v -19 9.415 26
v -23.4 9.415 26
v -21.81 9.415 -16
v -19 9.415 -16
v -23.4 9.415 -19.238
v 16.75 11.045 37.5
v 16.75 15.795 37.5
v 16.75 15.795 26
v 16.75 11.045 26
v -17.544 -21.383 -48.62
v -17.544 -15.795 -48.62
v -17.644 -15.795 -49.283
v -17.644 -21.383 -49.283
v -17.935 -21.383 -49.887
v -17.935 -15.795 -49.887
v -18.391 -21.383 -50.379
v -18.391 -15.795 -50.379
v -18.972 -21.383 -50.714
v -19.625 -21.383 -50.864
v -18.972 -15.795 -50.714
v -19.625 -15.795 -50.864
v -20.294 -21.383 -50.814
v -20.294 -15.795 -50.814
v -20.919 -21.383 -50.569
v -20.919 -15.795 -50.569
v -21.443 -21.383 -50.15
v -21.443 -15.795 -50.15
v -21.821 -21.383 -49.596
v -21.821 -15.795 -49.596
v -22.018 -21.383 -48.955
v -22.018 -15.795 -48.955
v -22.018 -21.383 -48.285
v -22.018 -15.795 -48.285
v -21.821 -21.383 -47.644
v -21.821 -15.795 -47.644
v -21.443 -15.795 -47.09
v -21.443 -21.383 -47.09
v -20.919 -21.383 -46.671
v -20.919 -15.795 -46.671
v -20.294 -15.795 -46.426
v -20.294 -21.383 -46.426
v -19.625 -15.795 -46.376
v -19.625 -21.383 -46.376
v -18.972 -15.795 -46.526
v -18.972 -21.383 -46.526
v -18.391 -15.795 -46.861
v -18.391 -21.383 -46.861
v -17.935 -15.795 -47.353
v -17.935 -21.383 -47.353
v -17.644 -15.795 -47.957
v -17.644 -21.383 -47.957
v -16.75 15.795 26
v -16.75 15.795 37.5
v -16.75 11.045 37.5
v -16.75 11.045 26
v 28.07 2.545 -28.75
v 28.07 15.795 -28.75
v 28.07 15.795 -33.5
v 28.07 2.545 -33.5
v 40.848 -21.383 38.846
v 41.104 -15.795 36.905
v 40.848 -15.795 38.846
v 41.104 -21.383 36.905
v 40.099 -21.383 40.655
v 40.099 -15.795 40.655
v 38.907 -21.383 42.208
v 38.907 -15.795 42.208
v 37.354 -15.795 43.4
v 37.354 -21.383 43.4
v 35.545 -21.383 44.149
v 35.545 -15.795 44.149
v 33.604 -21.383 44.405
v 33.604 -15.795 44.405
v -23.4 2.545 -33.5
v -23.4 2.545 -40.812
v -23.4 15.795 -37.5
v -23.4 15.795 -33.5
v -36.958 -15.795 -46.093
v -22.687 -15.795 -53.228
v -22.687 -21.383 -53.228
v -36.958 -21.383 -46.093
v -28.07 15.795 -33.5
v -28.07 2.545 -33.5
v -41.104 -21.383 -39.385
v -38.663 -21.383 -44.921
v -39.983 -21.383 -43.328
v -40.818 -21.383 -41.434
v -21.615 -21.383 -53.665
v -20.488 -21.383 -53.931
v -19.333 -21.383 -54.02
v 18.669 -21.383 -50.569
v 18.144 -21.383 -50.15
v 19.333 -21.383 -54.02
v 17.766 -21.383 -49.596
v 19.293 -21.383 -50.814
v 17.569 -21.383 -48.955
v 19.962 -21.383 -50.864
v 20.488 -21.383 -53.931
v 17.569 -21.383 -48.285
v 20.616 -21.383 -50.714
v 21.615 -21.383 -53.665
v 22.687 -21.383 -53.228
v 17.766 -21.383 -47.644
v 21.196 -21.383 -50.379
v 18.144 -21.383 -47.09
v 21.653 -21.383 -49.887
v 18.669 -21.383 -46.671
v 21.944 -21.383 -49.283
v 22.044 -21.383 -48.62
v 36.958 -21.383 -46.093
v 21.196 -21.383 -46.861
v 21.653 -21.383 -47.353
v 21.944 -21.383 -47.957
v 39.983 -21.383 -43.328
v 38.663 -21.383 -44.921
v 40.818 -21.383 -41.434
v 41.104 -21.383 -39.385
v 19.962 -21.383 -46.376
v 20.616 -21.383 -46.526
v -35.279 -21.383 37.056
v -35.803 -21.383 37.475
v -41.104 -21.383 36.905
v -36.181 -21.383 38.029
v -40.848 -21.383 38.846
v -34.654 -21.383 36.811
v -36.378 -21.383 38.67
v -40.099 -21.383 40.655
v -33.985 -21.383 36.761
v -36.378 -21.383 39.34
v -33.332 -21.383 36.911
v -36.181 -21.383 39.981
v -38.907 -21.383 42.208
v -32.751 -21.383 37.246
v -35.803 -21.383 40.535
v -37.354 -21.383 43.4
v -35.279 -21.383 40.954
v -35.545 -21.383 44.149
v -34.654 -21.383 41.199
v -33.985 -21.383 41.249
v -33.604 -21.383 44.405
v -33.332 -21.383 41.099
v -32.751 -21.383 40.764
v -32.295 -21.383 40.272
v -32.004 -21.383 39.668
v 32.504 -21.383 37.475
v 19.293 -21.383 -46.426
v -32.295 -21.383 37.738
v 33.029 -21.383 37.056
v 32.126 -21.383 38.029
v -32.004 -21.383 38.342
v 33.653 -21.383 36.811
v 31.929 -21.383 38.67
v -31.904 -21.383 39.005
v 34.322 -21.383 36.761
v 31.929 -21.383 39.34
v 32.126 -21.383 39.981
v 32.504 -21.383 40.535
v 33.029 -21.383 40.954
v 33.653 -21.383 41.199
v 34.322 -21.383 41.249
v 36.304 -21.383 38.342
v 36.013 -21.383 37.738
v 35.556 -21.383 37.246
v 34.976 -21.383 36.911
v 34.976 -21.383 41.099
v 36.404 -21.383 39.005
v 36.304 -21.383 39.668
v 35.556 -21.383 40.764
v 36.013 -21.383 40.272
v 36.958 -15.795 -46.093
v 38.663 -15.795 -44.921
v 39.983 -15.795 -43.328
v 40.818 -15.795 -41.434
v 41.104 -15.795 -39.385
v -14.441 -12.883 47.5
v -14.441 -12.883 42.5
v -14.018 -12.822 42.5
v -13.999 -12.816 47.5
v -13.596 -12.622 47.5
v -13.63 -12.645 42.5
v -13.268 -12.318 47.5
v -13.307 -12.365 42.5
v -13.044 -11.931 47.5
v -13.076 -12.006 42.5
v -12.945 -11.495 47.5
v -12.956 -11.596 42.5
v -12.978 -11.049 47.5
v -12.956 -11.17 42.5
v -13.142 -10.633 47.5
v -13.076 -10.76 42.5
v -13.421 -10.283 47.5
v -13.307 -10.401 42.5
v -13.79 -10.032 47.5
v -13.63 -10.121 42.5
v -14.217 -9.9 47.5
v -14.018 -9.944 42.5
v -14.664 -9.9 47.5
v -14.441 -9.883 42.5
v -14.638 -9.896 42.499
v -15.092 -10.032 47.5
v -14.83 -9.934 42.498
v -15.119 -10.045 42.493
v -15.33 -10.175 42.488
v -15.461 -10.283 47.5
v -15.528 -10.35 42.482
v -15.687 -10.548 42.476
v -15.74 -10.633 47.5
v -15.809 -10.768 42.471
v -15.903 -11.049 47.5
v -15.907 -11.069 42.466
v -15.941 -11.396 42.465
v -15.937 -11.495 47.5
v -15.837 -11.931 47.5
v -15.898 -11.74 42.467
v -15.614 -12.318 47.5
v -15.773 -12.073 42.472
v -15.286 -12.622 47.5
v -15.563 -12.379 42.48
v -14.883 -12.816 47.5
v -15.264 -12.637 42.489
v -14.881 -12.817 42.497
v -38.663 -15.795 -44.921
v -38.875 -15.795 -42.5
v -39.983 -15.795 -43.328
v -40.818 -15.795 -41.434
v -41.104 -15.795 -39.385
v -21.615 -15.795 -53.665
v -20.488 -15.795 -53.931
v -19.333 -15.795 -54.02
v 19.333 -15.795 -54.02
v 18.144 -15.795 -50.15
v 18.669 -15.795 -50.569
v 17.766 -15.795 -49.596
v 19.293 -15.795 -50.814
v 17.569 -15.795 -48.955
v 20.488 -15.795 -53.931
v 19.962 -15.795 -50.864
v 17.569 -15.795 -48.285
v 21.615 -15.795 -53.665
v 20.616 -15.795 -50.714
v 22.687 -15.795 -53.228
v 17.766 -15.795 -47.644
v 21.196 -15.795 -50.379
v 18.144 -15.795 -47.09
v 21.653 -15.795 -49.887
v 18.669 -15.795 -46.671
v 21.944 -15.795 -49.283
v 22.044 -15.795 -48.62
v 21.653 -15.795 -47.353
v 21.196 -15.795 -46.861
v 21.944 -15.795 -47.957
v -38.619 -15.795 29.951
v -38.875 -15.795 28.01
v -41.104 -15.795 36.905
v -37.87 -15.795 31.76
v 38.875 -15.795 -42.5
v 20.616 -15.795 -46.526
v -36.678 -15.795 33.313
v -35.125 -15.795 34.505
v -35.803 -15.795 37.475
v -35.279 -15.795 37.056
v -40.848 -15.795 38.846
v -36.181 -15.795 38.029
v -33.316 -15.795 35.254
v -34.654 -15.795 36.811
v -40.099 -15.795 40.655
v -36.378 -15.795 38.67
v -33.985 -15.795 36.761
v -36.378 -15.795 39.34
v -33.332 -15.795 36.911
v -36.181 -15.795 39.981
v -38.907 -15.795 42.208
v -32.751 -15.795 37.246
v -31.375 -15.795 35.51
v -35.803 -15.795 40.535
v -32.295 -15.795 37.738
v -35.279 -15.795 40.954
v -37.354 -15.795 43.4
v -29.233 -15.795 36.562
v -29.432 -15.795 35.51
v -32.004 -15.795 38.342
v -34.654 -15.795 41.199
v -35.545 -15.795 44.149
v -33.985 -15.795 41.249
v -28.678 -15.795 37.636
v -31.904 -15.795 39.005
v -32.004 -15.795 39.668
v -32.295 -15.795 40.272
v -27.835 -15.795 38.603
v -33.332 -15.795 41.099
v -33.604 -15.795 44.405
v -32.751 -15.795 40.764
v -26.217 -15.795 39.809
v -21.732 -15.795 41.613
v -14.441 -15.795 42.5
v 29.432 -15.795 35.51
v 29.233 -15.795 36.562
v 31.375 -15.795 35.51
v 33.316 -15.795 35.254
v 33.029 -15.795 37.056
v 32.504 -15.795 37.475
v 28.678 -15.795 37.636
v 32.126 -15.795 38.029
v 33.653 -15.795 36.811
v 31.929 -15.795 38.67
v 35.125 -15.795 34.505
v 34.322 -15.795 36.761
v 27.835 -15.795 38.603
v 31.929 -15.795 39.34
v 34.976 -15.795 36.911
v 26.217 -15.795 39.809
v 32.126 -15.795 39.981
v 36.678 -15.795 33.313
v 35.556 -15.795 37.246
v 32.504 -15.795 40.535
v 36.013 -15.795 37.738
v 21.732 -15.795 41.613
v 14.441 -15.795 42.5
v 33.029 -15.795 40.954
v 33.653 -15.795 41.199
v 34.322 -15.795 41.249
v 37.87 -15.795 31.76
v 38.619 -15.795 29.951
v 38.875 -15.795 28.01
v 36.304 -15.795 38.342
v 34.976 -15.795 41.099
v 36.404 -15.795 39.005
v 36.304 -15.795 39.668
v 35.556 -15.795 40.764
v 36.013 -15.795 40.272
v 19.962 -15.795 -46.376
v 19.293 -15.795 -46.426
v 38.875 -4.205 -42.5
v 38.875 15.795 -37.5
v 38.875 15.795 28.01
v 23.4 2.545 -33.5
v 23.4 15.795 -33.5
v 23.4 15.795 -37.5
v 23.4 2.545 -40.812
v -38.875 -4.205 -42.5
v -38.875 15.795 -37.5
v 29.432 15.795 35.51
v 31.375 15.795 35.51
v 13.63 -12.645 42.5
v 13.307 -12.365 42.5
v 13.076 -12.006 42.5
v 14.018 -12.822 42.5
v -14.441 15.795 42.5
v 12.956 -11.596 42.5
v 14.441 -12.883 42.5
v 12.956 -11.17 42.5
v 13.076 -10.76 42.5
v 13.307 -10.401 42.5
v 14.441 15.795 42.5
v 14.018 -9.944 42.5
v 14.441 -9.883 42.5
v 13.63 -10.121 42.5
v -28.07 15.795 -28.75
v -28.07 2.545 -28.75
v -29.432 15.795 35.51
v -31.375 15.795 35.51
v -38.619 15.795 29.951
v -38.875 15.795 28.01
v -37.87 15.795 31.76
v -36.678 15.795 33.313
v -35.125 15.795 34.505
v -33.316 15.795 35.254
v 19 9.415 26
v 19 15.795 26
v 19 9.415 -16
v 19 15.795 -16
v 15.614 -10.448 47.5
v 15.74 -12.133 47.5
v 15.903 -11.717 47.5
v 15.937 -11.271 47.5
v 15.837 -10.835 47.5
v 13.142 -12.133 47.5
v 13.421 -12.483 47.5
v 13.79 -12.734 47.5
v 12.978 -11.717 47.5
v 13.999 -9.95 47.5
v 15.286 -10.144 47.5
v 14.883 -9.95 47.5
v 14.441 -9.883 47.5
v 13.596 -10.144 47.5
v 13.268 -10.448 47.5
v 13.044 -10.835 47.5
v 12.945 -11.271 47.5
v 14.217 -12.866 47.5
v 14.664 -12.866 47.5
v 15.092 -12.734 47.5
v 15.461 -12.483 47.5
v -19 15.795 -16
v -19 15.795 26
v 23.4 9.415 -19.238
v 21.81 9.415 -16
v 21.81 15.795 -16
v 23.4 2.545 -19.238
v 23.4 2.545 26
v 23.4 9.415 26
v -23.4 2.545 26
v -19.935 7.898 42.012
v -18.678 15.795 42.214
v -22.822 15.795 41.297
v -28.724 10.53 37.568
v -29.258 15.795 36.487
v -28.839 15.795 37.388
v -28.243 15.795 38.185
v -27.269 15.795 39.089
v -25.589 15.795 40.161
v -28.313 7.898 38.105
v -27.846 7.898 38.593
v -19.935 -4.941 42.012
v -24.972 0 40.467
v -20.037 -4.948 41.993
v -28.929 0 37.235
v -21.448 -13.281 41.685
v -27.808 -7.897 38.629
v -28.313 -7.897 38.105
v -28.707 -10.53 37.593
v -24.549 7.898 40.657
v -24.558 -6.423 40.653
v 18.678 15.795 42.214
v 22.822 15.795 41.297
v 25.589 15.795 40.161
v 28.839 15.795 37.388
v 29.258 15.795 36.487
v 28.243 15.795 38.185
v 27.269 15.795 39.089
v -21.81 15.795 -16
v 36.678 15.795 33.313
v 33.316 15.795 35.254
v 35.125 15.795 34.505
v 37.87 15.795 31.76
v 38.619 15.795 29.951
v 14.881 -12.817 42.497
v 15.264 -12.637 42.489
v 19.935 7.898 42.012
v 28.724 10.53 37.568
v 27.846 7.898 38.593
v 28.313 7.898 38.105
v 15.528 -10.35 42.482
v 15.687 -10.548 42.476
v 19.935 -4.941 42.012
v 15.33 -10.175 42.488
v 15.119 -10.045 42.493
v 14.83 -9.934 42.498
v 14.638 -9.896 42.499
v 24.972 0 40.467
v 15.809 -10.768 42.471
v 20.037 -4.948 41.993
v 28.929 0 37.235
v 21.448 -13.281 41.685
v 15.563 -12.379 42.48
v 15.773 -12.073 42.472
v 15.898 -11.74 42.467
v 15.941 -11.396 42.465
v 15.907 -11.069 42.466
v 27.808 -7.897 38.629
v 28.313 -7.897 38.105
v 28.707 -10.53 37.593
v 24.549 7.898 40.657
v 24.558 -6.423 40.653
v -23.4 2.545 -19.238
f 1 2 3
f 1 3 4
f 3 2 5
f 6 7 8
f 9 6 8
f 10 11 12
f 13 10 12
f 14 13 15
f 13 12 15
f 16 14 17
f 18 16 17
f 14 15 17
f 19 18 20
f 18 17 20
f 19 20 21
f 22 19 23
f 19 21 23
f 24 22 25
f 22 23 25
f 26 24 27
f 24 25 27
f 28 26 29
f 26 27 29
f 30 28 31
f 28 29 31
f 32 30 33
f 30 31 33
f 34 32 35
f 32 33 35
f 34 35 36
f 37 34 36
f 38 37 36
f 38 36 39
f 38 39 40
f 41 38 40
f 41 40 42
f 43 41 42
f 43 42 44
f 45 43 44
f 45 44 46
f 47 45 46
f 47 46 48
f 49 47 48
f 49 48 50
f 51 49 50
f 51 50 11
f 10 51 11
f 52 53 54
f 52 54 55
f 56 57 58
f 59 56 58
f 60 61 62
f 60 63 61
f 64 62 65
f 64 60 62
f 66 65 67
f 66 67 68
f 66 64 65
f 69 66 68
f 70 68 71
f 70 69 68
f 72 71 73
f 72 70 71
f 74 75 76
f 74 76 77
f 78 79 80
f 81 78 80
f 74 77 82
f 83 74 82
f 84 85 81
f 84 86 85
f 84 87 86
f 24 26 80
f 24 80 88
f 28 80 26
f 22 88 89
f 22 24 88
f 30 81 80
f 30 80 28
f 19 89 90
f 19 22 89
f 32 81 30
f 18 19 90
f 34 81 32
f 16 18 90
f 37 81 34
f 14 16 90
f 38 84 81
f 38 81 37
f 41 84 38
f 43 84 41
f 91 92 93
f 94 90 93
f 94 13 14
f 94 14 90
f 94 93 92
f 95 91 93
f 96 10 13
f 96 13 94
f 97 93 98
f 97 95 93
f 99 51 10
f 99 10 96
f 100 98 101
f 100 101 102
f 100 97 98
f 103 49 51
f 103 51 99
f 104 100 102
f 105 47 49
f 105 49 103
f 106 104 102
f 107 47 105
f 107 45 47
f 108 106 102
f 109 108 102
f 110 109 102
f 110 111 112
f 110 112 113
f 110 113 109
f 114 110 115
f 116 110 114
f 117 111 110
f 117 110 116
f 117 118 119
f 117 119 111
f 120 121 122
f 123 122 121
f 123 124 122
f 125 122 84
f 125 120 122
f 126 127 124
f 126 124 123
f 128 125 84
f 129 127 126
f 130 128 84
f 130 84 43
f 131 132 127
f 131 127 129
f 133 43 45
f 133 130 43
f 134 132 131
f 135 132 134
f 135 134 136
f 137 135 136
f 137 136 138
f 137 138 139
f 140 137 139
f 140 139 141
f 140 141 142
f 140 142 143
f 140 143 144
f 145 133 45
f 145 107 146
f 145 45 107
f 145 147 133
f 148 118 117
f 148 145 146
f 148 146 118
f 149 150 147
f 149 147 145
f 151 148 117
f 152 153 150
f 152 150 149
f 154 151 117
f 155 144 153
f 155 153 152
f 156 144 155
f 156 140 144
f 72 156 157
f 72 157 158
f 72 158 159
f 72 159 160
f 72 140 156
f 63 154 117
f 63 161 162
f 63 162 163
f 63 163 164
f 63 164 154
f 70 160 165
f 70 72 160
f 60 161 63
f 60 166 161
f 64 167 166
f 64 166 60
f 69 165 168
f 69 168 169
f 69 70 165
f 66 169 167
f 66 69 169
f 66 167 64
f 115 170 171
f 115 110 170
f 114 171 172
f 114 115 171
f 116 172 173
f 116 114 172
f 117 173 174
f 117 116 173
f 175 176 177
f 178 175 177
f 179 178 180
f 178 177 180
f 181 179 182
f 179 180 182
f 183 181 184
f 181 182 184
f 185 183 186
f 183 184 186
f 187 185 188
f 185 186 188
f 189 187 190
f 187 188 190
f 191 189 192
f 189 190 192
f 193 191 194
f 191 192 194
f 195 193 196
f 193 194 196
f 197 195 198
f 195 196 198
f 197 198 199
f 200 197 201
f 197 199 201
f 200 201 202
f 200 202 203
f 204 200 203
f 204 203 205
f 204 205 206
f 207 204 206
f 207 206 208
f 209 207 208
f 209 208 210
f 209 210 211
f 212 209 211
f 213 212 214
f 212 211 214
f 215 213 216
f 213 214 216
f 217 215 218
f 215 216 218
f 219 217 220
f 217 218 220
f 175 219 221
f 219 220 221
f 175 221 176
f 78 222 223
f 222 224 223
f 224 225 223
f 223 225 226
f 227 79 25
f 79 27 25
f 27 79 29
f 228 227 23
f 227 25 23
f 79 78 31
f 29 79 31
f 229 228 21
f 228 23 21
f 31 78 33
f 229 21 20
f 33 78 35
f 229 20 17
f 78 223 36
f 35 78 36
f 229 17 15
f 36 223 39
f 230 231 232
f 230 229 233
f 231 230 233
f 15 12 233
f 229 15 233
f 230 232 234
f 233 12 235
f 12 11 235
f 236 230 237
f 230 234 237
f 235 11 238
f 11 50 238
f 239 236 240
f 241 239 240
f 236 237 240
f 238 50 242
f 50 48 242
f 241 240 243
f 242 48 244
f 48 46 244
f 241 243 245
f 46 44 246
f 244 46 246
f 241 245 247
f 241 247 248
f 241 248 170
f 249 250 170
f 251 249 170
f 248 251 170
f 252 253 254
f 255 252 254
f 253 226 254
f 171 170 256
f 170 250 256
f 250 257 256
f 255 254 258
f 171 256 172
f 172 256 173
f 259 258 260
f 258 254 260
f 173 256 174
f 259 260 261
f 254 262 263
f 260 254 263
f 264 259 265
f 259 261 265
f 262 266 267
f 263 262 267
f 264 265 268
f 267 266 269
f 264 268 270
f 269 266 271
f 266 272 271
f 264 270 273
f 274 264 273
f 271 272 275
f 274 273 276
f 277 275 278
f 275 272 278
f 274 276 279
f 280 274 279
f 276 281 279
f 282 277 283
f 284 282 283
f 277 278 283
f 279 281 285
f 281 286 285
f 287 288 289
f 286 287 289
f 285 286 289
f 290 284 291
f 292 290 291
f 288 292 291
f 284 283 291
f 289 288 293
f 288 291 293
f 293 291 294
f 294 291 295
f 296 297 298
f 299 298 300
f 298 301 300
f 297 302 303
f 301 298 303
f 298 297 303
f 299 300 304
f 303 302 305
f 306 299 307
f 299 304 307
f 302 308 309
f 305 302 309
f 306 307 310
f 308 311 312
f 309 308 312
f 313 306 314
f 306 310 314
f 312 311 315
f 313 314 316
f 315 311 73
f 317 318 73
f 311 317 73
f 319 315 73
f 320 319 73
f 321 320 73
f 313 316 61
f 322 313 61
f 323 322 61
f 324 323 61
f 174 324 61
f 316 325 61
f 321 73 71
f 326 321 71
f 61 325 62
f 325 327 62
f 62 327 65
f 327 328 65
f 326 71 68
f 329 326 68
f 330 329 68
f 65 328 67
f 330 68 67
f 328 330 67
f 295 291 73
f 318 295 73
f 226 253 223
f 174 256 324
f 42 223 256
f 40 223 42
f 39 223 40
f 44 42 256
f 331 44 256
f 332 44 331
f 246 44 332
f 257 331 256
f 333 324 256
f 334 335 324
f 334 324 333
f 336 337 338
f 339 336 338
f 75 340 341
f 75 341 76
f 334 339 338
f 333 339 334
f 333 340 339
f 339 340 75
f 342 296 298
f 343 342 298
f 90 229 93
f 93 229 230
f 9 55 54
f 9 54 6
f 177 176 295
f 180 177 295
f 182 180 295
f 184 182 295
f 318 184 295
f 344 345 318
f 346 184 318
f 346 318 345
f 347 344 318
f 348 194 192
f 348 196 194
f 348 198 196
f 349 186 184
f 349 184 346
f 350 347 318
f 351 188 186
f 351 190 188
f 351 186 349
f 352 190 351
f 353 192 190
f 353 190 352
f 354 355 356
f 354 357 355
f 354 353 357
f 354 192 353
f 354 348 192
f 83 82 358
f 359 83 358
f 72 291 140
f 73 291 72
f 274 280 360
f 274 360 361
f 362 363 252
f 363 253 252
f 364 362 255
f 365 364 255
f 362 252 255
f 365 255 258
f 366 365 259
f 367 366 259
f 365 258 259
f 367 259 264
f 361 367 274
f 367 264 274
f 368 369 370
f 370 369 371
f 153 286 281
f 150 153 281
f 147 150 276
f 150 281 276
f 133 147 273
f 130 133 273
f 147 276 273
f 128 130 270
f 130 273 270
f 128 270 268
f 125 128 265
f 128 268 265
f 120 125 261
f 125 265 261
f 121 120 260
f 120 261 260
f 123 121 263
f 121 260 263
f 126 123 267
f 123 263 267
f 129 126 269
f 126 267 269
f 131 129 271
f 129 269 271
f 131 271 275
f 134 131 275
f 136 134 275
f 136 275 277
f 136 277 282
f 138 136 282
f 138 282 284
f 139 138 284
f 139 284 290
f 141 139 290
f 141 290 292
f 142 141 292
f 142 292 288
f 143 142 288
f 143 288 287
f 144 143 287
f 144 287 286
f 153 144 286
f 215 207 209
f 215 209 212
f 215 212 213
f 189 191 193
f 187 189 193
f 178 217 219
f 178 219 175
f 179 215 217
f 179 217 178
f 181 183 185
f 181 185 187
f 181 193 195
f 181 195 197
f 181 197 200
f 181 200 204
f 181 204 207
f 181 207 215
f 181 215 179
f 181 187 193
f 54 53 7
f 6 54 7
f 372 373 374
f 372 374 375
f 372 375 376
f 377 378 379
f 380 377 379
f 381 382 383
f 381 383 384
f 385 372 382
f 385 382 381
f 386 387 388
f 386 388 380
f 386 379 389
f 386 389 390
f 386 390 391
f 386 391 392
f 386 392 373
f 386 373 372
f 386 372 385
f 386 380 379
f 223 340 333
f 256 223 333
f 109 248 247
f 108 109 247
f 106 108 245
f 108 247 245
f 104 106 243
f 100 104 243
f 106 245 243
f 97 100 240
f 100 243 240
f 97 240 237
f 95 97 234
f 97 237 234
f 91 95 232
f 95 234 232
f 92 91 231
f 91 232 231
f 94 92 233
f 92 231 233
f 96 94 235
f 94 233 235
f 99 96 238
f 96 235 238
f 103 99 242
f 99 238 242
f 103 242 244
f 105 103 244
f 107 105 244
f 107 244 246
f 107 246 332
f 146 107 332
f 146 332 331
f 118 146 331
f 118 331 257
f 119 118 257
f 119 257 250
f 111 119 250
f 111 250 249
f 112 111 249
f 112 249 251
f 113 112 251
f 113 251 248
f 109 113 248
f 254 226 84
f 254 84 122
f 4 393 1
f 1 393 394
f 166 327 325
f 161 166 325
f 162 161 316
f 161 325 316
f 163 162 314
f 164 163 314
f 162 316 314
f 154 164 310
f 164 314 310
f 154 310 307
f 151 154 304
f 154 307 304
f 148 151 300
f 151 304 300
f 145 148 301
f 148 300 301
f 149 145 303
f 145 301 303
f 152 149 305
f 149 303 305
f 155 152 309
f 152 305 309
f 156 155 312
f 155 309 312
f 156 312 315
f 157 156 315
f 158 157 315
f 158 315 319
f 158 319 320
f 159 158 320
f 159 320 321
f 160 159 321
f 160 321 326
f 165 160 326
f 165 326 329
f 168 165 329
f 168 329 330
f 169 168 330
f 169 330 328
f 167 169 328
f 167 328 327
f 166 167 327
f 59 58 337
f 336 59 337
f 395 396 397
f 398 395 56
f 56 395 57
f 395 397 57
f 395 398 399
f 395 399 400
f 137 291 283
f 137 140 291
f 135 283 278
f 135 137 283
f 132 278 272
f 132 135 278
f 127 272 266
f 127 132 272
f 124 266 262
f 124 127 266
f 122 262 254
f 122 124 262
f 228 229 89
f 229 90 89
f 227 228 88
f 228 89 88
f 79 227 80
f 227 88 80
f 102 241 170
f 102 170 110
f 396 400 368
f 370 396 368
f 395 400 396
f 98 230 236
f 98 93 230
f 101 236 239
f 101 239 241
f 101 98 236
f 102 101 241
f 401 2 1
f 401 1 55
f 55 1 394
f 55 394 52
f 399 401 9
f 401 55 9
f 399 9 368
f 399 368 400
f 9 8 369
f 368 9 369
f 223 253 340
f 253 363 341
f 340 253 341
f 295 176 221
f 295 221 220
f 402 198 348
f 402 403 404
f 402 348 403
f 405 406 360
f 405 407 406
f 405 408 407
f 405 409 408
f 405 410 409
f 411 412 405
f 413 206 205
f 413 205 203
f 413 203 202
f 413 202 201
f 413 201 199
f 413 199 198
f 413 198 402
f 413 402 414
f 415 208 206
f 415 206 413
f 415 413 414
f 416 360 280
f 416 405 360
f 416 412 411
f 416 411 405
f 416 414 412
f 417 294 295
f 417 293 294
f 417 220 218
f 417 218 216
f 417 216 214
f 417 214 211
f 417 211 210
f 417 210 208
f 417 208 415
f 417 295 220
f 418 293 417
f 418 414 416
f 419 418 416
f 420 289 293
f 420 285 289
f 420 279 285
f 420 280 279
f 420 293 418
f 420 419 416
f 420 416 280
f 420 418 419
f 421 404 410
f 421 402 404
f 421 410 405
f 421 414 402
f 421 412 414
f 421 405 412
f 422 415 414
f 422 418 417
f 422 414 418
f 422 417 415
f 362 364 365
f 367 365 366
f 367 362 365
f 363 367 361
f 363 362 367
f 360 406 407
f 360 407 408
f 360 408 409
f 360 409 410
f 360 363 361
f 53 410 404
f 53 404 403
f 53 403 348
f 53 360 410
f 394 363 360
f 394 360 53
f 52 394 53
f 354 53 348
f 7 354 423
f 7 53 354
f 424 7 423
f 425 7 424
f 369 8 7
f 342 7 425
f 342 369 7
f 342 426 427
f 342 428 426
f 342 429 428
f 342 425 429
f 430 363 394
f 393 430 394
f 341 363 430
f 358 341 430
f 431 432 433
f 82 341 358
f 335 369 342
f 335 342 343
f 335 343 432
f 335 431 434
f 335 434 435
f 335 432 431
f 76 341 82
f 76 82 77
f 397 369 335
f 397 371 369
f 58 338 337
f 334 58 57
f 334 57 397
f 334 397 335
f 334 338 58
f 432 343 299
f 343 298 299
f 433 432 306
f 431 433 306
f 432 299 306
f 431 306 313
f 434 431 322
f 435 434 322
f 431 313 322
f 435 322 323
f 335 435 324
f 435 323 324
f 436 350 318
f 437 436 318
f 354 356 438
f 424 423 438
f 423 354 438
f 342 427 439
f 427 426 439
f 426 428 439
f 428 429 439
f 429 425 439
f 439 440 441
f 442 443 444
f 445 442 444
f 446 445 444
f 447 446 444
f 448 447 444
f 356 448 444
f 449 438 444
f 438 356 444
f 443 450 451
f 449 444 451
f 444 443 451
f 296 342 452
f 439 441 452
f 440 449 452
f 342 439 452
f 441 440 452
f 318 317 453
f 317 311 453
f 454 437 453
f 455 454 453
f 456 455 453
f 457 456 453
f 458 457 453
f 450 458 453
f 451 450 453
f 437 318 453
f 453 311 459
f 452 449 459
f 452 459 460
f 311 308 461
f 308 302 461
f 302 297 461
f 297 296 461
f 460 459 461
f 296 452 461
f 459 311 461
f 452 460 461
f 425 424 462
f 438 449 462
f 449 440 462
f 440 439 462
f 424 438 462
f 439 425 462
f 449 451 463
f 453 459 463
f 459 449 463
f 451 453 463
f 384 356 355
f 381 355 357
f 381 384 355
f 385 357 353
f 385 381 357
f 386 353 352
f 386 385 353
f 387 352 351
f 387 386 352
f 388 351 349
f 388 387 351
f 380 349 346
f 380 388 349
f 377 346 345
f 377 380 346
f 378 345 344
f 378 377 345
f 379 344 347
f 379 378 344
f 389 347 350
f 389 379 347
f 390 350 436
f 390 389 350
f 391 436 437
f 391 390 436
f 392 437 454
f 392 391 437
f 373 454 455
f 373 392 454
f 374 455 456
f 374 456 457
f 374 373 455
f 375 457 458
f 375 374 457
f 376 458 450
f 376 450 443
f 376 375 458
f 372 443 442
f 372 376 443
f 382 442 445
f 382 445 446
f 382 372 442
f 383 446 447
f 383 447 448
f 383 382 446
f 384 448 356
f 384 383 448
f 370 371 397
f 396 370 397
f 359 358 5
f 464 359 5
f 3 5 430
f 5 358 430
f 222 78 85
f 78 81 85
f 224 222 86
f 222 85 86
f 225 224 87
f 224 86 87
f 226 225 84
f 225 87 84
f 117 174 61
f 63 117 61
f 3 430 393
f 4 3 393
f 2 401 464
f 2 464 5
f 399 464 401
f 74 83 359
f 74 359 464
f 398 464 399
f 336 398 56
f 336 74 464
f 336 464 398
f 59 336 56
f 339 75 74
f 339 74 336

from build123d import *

# Parameters (mm, degrees)
SKETCH1_W            = 77.75
SKETCH1_H            = 85
BOSS_EXTRUDE1_DEPTH  = 15.795
SKETCH2_W            = 82.2071
SKETCH2_H            = 98.425
BOSS_EXTRUDE2_DEPTH  = 5.588
M4_CLEARANCE_HOLE1_D = 4.5
CHAMFER1_SIZE        = 20
CHAMFER1_SIZE2       = 10
CHAMFER2_SIZE        = 10
CHAMFER2_SIZE2       = 20
CUT_EXTRUDE1_DEPTH   = 13.25
SKETCH7_W            = 4.4
SKETCH7_H            = 6.87
CUT_EXTRUDE2_DEPTH   = 68.5
SKETCH9_W            = 33.5
SKETCH9_H            = 11.5
CUT_EXTRUDE3_DEPTH   = 4.75
SKETCH10_W           = 9.4429
SKETCH10_H           = 6.99
CUT_EXTRUDE4_DEPTH   = 31.59
FILLET1_R            = 7.5
FILLET2_START        = -15.795
FILLET2_DEPTH        = 32.795
FILLET3_START        = -15.795
FILLET3_DEPTH        = 32.795
CHAMFER3_SIZE        = 5
CHAMFER3_SIZE2       = 20
SKETCH11_R           = 1.5
BOSS_EXTRUDE3_DEPTH  = 5


with BuildPart() as part:
    # Sketch1 → Boss-Extrude1 (new, symmetric)
    with BuildSketch(Plane(origin=(0, 0, 0), x_dir=(1, 0, 0), z_dir=(0, 1, 0))):
        Rectangle(SKETCH1_W, SKETCH1_H)
    extrude(amount=BOSS_EXTRUDE1_DEPTH, both=True)

    # Sketch2 → Boss-Extrude2 (add)
    with BuildSketch(Plane.XZ.offset(15.795)):
        with Locations((0, -4.8075)):
            Rectangle(SKETCH2_W, SKETCH2_H)
    extrude(amount=BOSS_EXTRUDE2_DEPTH)

    # M4 Clearance Hole1 (through all)
    with Locations(Plane(origin=(0, -21.383, 0), x_dir=(-1, 0, 0), z_dir=(0, -1, 0))):
        with Locations((-19.79355, 48.62), (19.79355, 48.62), (34.15355, -39.005), (-34.15355, -39.005)):
            Hole(M4_CLEARANCE_HOLE1_D / 2)

    # Chamfer1
    chamfer1_edges = [part.edges().sort_by_distance(p)[0] for p in [
        (41.10355, -18.589, -54.02),
    ]]
    chamfer1_side = [part.faces().sort_by_distance(p)[0] for p in [
        (0, -18.589, -54.02),
    ]]
    chamfer(chamfer1_edges, length=CHAMFER1_SIZE, length2=CHAMFER1_SIZE2, reference=chamfer1_side[0])

    # Chamfer2
    chamfer2_edges = [part.edges().sort_by_distance(p)[0] for p in [
        (-41.10355, -18.589, -54.02),
    ]]
    chamfer2_side = [part.faces().sort_by_distance(p)[0] for p in [
        (-41.10355, -18.589, -4.8075),
    ]]
    chamfer(chamfer2_edges, length=CHAMFER2_SIZE, length2=CHAMFER2_SIZE2, reference=chamfer2_side[0])

    # Sketch6 → Cut-Extrude1 (cut)
    with BuildSketch(Plane(origin=(0, 15.795, 0), x_dir=(1, 0, 0), z_dir=(0, 1, 0))):
        Polygon((-23.4, 42.5), (-23.4, 33.5), (-28.07, 33.5), (-28.07, 28.75), (-21.81, 16), (-19, 16), (-19, -26), (19, -26), (19, 16), (21.81, 16), (28.07, 28.75), (28.07, 33.5), (23.4, 33.5), (23.4, 42.5), align=None)
    extrude(amount=-CUT_EXTRUDE1_DEPTH, mode=Mode.SUBTRACT)

    # Sketch7 → Cut-Extrude2 (cut)
    with BuildSketch(Plane(origin=(0, 0, -42.5), x_dir=(-1, 0, 0), z_dir=(0, 0, -1))):
        with Locations((-21.2, 5.98)):
            Rectangle(SKETCH7_W, SKETCH7_H)
    cut_extrude2 = extrude(amount=-CUT_EXTRUDE2_DEPTH, mode=Mode.SUBTRACT)

    # Mirror7: Cut-Extrude2 across plane
    add(cut_extrude2.mirror(Plane(origin=(0, 0, 0), x_dir=(0, 0, 1), z_dir=(1, 0, 0))), mode=Mode.SUBTRACT)

    # Sketch9 → Cut-Extrude3 (cut)
    with BuildSketch(Plane(origin=(0, 15.795, 0), x_dir=(1, 0, 0), z_dir=(0, 1, 0))):
        with Locations((0, -31.75)):
            Rectangle(SKETCH9_W, SKETCH9_H)
    extrude(amount=-CUT_EXTRUDE3_DEPTH, mode=Mode.SUBTRACT)

    # Sketch10 → Cut-Extrude4 (cut)
    with BuildSketch(Plane(origin=(0, 15.795, 0), x_dir=(1, 0, 0), z_dir=(0, 1, 0))):
        with Locations((34.15355, -39.005)):
            Rectangle(SKETCH10_W, SKETCH10_H)
    cut_extrude4 = extrude(amount=-CUT_EXTRUDE4_DEPTH, mode=Mode.SUBTRACT)

    # Mirror8: Cut-Extrude4 across plane
    add(cut_extrude4.mirror(Plane(origin=(0, 0, 0), x_dir=(0, 0, 1), z_dir=(1, 0, 0))), mode=Mode.SUBTRACT)

    # Fillet1
    fillet1_edges = [part.edges().sort_by_distance(p)[0] for p in [
        (41.10355, -18.589, 44.405),
        (-41.10355, -18.589, 44.405),
        (38.875, 0, 35.51),
        (-38.875, 0, 35.51),
        (41.10355, -18.589, -44.02),
        (21.10355, -18.589, -54.02),
        (-21.10355, -18.589, -54.02),
        (-41.10355, -18.589, -44.02),
    ]]
    fillet(fillet1_edges, radius=FILLET1_R)

    # Fillet2: read off the stored shape, not the designer's step
    # Fillet2 outline → Fillet2 (cut)
    with BuildSketch(Plane(origin=(0, 0, 0), x_dir=(1, 0, 0), z_dir=(0, 1, 0)).offset(FILLET2_START)):
        with BuildLine():
            Line((-29.4321, -42.5), (-14.440772507, -42.5))
            add(Edge.make_bspline(
                [(-14.440772507, -42.5), (-29.194302513, -42.5), (-29.4321, -35.51)],
                knots=[0, 0, 0, 1, 1, 1], degree=2, weights=[1, 0.71902712, 1]))
            Line((-29.4321, -35.51), (-29.4321, -42.5))
        make_face()
    extrude(amount=FILLET2_DEPTH, mode=Mode.SUBTRACT)

    # Fillet3: read off the stored shape, not the designer's step
    # Fillet3 outline → Fillet3 (cut)
    with BuildSketch(Plane(origin=(0, 0, 0), x_dir=(1, 0, 0), z_dir=(0, 1, 0)).offset(FILLET3_START)):
        with BuildLine():
            add(Edge.make_bspline(
                [(14.440772507, -42.5), (29.194302513, -42.5), (29.4321, -35.51)],
                knots=[0, 0, 0, 1, 1, 1], degree=2, weights=[1, 0.71902712, 1]))
            Line((14.440772507, -42.5), (29.4321, -42.5))
            Line((29.4321, -42.5), (29.4321, -35.51))
        make_face()
    extrude(amount=FILLET3_DEPTH, mode=Mode.SUBTRACT)

    # Chamfer3
    chamfer3_edges = [part.edges().sort_by_distance(p)[0] for p in [
        (-31.1375, 15.795, -42.5),
    ]]
    chamfer3_side = [part.faces().sort_by_distance(p)[0] for p in [
        (30.40355, 15.795, 34.358042424),
    ]]
    chamfer(chamfer3_edges, length=CHAMFER3_SIZE, length2=CHAMFER3_SIZE2, reference=chamfer3_side[0])

    # Sketch11 → Boss-Extrude3 (add, symmetric)
    with BuildSketch(Plane.XY.offset(42.5)):
        with Locations(Location((-14.440772507, -11.383, 0), (0, 0, 270))):
            Circle(SKETCH11_R)
        with Locations(Location((14.440772507, -11.383, 0), (0, 0, 90))):
            Circle(SKETCH11_R)
    extrude(amount=BOSS_EXTRUDE3_DEPTH, both=True)


solid = part.part
